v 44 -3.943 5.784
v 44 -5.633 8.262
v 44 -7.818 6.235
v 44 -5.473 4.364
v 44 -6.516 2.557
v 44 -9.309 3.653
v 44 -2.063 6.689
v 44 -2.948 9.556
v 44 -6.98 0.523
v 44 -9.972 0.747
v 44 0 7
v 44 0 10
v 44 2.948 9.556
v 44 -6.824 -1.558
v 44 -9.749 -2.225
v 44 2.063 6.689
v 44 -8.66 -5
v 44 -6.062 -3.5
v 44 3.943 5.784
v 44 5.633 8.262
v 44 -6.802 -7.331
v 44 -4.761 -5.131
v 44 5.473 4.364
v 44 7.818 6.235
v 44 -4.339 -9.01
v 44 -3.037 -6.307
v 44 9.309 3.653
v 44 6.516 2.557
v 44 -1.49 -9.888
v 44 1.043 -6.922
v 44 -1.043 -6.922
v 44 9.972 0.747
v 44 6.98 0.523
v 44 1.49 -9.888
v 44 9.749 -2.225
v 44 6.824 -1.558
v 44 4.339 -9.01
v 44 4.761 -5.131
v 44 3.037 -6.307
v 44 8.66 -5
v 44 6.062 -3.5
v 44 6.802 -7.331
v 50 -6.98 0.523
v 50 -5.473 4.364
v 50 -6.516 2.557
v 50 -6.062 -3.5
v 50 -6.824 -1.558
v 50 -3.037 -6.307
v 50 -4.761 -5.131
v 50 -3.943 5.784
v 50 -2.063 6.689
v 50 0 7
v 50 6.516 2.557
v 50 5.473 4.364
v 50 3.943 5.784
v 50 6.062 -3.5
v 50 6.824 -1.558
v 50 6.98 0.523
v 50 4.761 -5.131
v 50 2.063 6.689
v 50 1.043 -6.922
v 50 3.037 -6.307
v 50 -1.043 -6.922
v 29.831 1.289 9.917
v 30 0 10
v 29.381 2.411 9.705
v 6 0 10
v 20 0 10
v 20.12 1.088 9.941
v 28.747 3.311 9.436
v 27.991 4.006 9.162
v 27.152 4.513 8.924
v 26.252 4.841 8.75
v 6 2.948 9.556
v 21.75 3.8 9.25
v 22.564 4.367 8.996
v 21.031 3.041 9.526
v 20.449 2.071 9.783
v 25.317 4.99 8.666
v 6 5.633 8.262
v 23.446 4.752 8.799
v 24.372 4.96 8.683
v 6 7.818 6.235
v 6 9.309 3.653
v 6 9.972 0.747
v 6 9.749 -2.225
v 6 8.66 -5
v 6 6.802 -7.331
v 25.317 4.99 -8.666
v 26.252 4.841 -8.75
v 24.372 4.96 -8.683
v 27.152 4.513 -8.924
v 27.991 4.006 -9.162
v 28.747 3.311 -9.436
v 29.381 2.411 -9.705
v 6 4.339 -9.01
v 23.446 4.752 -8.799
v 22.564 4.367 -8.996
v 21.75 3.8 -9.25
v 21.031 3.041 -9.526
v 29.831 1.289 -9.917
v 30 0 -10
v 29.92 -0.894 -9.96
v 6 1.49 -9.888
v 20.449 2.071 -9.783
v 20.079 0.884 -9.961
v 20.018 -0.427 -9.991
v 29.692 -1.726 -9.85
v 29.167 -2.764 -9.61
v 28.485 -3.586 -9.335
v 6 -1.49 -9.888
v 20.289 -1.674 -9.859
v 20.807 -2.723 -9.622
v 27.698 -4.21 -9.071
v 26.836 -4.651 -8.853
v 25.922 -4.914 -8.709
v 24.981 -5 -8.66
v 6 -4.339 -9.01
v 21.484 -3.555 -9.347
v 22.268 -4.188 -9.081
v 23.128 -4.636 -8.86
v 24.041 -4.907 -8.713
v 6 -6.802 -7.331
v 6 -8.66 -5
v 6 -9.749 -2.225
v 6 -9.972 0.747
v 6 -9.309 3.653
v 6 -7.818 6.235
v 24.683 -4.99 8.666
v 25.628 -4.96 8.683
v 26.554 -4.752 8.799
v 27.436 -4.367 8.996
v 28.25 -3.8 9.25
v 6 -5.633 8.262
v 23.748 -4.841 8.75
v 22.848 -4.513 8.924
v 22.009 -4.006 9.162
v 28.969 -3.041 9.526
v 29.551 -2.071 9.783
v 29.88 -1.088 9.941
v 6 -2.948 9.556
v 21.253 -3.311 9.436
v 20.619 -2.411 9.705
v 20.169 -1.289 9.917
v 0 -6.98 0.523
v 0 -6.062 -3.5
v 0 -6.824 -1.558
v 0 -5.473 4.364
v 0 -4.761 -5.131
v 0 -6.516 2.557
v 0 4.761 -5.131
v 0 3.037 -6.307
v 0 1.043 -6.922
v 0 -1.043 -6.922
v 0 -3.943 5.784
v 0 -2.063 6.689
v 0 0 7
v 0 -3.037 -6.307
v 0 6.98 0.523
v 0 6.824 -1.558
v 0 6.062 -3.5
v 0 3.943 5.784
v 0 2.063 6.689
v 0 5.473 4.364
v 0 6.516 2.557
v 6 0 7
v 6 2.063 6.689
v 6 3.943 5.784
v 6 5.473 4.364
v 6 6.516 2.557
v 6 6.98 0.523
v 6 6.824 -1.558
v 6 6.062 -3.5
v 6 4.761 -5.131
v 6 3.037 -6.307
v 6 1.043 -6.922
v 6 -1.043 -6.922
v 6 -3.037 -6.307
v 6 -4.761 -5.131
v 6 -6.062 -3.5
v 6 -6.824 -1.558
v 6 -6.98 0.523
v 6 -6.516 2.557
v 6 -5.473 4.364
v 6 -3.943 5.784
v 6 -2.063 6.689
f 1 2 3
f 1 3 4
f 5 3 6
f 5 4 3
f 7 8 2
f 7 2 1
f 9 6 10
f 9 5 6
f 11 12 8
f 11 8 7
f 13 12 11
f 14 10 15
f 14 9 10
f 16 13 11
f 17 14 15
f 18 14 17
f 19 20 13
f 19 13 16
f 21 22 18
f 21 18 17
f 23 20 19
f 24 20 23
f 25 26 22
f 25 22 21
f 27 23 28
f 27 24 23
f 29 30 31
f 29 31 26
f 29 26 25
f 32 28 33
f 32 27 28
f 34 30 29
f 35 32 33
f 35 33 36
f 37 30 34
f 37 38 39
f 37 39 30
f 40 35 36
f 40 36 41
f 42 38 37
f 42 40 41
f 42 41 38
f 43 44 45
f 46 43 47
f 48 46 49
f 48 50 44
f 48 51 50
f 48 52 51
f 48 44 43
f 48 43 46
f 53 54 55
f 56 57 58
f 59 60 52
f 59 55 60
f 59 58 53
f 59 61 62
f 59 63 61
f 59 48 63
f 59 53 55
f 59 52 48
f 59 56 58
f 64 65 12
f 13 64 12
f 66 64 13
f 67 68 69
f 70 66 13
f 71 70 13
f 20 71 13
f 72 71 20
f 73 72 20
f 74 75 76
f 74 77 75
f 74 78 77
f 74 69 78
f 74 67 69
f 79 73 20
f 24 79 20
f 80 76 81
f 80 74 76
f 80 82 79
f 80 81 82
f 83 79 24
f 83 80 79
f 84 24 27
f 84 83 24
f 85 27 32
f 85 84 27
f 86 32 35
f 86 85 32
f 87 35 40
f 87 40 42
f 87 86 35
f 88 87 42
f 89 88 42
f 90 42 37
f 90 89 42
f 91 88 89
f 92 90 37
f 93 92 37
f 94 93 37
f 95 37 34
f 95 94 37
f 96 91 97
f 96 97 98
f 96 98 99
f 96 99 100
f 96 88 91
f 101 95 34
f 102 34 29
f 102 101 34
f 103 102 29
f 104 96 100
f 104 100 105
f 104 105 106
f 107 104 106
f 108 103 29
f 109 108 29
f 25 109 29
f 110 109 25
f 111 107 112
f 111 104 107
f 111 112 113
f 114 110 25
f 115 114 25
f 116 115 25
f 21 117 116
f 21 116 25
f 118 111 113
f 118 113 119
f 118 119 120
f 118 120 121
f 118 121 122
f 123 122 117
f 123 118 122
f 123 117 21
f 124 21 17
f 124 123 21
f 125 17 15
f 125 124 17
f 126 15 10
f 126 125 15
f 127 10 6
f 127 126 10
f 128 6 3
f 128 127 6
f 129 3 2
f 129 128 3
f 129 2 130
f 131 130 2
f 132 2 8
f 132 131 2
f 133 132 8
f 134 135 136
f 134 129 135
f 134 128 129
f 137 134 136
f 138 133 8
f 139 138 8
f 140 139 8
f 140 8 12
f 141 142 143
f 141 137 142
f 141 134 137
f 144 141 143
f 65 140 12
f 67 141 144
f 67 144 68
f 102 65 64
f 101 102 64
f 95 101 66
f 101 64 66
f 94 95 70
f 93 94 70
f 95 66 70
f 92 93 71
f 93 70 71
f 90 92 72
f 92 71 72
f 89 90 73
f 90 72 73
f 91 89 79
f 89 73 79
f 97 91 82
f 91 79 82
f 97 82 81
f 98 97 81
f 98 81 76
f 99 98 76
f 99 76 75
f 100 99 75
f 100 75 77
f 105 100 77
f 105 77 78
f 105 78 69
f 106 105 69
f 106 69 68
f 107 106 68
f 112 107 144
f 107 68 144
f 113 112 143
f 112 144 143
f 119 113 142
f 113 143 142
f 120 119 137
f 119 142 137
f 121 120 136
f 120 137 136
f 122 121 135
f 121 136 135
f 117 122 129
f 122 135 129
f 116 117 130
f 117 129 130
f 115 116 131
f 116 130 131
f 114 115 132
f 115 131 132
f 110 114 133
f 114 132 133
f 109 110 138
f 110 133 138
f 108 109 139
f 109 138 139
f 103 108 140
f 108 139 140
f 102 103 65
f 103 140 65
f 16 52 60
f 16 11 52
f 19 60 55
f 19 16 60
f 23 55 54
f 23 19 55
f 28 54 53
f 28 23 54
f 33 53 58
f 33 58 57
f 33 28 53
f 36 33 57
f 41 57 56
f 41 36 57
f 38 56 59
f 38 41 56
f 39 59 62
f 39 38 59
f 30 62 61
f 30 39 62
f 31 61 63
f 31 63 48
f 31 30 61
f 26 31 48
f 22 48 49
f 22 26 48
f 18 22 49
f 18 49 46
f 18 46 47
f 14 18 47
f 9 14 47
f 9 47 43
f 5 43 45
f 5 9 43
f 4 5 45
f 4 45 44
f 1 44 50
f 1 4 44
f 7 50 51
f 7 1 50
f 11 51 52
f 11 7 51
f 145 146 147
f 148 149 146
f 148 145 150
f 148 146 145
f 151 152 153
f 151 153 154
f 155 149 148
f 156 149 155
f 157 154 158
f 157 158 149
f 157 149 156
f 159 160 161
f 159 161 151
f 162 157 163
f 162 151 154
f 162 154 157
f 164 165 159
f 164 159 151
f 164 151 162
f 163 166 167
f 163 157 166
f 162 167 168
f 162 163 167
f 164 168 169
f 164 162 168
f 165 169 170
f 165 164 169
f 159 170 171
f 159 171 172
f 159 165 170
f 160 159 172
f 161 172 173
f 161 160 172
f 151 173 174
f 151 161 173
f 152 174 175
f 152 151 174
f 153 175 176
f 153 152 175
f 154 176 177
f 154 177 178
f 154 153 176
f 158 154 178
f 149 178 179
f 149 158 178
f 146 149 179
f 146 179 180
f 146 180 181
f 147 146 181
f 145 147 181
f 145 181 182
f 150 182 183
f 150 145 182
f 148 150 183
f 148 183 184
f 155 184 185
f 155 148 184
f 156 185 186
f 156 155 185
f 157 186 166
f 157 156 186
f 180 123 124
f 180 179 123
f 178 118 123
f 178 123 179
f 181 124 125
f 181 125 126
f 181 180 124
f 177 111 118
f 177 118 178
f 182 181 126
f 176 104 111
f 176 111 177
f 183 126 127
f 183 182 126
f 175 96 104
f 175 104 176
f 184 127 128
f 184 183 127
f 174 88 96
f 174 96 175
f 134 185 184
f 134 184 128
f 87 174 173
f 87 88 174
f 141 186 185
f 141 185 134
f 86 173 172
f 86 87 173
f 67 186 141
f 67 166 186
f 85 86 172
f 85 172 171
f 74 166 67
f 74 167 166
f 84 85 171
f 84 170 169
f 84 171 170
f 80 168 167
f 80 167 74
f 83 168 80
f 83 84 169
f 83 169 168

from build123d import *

# Parameters (mm, degrees)
F3_R     = 5
F4_DEPTH = 20.001


with BuildPart() as f1:
    # F0 (on Front) → F1 (revolve)
    with BuildSketch(Plane.XZ):
        Polygon((0, 7), (0, 0), (50, 0), (50, 7), (44, 7), (44, 10), (6, 10), (6, 7), align=None)
    revolve(axis=Axis((25, 0, 0), (-1, 0, 0)))

    # F3 (on offset) → F4 (cut, through all)
    with BuildSketch(Plane.XY.offset(10)):
        with Locations((25, 0)):
            Circle(F3_R)
    extrude(amount=-F4_DEPTH, mode=Mode.SUBTRACT)


solid = f1.part
